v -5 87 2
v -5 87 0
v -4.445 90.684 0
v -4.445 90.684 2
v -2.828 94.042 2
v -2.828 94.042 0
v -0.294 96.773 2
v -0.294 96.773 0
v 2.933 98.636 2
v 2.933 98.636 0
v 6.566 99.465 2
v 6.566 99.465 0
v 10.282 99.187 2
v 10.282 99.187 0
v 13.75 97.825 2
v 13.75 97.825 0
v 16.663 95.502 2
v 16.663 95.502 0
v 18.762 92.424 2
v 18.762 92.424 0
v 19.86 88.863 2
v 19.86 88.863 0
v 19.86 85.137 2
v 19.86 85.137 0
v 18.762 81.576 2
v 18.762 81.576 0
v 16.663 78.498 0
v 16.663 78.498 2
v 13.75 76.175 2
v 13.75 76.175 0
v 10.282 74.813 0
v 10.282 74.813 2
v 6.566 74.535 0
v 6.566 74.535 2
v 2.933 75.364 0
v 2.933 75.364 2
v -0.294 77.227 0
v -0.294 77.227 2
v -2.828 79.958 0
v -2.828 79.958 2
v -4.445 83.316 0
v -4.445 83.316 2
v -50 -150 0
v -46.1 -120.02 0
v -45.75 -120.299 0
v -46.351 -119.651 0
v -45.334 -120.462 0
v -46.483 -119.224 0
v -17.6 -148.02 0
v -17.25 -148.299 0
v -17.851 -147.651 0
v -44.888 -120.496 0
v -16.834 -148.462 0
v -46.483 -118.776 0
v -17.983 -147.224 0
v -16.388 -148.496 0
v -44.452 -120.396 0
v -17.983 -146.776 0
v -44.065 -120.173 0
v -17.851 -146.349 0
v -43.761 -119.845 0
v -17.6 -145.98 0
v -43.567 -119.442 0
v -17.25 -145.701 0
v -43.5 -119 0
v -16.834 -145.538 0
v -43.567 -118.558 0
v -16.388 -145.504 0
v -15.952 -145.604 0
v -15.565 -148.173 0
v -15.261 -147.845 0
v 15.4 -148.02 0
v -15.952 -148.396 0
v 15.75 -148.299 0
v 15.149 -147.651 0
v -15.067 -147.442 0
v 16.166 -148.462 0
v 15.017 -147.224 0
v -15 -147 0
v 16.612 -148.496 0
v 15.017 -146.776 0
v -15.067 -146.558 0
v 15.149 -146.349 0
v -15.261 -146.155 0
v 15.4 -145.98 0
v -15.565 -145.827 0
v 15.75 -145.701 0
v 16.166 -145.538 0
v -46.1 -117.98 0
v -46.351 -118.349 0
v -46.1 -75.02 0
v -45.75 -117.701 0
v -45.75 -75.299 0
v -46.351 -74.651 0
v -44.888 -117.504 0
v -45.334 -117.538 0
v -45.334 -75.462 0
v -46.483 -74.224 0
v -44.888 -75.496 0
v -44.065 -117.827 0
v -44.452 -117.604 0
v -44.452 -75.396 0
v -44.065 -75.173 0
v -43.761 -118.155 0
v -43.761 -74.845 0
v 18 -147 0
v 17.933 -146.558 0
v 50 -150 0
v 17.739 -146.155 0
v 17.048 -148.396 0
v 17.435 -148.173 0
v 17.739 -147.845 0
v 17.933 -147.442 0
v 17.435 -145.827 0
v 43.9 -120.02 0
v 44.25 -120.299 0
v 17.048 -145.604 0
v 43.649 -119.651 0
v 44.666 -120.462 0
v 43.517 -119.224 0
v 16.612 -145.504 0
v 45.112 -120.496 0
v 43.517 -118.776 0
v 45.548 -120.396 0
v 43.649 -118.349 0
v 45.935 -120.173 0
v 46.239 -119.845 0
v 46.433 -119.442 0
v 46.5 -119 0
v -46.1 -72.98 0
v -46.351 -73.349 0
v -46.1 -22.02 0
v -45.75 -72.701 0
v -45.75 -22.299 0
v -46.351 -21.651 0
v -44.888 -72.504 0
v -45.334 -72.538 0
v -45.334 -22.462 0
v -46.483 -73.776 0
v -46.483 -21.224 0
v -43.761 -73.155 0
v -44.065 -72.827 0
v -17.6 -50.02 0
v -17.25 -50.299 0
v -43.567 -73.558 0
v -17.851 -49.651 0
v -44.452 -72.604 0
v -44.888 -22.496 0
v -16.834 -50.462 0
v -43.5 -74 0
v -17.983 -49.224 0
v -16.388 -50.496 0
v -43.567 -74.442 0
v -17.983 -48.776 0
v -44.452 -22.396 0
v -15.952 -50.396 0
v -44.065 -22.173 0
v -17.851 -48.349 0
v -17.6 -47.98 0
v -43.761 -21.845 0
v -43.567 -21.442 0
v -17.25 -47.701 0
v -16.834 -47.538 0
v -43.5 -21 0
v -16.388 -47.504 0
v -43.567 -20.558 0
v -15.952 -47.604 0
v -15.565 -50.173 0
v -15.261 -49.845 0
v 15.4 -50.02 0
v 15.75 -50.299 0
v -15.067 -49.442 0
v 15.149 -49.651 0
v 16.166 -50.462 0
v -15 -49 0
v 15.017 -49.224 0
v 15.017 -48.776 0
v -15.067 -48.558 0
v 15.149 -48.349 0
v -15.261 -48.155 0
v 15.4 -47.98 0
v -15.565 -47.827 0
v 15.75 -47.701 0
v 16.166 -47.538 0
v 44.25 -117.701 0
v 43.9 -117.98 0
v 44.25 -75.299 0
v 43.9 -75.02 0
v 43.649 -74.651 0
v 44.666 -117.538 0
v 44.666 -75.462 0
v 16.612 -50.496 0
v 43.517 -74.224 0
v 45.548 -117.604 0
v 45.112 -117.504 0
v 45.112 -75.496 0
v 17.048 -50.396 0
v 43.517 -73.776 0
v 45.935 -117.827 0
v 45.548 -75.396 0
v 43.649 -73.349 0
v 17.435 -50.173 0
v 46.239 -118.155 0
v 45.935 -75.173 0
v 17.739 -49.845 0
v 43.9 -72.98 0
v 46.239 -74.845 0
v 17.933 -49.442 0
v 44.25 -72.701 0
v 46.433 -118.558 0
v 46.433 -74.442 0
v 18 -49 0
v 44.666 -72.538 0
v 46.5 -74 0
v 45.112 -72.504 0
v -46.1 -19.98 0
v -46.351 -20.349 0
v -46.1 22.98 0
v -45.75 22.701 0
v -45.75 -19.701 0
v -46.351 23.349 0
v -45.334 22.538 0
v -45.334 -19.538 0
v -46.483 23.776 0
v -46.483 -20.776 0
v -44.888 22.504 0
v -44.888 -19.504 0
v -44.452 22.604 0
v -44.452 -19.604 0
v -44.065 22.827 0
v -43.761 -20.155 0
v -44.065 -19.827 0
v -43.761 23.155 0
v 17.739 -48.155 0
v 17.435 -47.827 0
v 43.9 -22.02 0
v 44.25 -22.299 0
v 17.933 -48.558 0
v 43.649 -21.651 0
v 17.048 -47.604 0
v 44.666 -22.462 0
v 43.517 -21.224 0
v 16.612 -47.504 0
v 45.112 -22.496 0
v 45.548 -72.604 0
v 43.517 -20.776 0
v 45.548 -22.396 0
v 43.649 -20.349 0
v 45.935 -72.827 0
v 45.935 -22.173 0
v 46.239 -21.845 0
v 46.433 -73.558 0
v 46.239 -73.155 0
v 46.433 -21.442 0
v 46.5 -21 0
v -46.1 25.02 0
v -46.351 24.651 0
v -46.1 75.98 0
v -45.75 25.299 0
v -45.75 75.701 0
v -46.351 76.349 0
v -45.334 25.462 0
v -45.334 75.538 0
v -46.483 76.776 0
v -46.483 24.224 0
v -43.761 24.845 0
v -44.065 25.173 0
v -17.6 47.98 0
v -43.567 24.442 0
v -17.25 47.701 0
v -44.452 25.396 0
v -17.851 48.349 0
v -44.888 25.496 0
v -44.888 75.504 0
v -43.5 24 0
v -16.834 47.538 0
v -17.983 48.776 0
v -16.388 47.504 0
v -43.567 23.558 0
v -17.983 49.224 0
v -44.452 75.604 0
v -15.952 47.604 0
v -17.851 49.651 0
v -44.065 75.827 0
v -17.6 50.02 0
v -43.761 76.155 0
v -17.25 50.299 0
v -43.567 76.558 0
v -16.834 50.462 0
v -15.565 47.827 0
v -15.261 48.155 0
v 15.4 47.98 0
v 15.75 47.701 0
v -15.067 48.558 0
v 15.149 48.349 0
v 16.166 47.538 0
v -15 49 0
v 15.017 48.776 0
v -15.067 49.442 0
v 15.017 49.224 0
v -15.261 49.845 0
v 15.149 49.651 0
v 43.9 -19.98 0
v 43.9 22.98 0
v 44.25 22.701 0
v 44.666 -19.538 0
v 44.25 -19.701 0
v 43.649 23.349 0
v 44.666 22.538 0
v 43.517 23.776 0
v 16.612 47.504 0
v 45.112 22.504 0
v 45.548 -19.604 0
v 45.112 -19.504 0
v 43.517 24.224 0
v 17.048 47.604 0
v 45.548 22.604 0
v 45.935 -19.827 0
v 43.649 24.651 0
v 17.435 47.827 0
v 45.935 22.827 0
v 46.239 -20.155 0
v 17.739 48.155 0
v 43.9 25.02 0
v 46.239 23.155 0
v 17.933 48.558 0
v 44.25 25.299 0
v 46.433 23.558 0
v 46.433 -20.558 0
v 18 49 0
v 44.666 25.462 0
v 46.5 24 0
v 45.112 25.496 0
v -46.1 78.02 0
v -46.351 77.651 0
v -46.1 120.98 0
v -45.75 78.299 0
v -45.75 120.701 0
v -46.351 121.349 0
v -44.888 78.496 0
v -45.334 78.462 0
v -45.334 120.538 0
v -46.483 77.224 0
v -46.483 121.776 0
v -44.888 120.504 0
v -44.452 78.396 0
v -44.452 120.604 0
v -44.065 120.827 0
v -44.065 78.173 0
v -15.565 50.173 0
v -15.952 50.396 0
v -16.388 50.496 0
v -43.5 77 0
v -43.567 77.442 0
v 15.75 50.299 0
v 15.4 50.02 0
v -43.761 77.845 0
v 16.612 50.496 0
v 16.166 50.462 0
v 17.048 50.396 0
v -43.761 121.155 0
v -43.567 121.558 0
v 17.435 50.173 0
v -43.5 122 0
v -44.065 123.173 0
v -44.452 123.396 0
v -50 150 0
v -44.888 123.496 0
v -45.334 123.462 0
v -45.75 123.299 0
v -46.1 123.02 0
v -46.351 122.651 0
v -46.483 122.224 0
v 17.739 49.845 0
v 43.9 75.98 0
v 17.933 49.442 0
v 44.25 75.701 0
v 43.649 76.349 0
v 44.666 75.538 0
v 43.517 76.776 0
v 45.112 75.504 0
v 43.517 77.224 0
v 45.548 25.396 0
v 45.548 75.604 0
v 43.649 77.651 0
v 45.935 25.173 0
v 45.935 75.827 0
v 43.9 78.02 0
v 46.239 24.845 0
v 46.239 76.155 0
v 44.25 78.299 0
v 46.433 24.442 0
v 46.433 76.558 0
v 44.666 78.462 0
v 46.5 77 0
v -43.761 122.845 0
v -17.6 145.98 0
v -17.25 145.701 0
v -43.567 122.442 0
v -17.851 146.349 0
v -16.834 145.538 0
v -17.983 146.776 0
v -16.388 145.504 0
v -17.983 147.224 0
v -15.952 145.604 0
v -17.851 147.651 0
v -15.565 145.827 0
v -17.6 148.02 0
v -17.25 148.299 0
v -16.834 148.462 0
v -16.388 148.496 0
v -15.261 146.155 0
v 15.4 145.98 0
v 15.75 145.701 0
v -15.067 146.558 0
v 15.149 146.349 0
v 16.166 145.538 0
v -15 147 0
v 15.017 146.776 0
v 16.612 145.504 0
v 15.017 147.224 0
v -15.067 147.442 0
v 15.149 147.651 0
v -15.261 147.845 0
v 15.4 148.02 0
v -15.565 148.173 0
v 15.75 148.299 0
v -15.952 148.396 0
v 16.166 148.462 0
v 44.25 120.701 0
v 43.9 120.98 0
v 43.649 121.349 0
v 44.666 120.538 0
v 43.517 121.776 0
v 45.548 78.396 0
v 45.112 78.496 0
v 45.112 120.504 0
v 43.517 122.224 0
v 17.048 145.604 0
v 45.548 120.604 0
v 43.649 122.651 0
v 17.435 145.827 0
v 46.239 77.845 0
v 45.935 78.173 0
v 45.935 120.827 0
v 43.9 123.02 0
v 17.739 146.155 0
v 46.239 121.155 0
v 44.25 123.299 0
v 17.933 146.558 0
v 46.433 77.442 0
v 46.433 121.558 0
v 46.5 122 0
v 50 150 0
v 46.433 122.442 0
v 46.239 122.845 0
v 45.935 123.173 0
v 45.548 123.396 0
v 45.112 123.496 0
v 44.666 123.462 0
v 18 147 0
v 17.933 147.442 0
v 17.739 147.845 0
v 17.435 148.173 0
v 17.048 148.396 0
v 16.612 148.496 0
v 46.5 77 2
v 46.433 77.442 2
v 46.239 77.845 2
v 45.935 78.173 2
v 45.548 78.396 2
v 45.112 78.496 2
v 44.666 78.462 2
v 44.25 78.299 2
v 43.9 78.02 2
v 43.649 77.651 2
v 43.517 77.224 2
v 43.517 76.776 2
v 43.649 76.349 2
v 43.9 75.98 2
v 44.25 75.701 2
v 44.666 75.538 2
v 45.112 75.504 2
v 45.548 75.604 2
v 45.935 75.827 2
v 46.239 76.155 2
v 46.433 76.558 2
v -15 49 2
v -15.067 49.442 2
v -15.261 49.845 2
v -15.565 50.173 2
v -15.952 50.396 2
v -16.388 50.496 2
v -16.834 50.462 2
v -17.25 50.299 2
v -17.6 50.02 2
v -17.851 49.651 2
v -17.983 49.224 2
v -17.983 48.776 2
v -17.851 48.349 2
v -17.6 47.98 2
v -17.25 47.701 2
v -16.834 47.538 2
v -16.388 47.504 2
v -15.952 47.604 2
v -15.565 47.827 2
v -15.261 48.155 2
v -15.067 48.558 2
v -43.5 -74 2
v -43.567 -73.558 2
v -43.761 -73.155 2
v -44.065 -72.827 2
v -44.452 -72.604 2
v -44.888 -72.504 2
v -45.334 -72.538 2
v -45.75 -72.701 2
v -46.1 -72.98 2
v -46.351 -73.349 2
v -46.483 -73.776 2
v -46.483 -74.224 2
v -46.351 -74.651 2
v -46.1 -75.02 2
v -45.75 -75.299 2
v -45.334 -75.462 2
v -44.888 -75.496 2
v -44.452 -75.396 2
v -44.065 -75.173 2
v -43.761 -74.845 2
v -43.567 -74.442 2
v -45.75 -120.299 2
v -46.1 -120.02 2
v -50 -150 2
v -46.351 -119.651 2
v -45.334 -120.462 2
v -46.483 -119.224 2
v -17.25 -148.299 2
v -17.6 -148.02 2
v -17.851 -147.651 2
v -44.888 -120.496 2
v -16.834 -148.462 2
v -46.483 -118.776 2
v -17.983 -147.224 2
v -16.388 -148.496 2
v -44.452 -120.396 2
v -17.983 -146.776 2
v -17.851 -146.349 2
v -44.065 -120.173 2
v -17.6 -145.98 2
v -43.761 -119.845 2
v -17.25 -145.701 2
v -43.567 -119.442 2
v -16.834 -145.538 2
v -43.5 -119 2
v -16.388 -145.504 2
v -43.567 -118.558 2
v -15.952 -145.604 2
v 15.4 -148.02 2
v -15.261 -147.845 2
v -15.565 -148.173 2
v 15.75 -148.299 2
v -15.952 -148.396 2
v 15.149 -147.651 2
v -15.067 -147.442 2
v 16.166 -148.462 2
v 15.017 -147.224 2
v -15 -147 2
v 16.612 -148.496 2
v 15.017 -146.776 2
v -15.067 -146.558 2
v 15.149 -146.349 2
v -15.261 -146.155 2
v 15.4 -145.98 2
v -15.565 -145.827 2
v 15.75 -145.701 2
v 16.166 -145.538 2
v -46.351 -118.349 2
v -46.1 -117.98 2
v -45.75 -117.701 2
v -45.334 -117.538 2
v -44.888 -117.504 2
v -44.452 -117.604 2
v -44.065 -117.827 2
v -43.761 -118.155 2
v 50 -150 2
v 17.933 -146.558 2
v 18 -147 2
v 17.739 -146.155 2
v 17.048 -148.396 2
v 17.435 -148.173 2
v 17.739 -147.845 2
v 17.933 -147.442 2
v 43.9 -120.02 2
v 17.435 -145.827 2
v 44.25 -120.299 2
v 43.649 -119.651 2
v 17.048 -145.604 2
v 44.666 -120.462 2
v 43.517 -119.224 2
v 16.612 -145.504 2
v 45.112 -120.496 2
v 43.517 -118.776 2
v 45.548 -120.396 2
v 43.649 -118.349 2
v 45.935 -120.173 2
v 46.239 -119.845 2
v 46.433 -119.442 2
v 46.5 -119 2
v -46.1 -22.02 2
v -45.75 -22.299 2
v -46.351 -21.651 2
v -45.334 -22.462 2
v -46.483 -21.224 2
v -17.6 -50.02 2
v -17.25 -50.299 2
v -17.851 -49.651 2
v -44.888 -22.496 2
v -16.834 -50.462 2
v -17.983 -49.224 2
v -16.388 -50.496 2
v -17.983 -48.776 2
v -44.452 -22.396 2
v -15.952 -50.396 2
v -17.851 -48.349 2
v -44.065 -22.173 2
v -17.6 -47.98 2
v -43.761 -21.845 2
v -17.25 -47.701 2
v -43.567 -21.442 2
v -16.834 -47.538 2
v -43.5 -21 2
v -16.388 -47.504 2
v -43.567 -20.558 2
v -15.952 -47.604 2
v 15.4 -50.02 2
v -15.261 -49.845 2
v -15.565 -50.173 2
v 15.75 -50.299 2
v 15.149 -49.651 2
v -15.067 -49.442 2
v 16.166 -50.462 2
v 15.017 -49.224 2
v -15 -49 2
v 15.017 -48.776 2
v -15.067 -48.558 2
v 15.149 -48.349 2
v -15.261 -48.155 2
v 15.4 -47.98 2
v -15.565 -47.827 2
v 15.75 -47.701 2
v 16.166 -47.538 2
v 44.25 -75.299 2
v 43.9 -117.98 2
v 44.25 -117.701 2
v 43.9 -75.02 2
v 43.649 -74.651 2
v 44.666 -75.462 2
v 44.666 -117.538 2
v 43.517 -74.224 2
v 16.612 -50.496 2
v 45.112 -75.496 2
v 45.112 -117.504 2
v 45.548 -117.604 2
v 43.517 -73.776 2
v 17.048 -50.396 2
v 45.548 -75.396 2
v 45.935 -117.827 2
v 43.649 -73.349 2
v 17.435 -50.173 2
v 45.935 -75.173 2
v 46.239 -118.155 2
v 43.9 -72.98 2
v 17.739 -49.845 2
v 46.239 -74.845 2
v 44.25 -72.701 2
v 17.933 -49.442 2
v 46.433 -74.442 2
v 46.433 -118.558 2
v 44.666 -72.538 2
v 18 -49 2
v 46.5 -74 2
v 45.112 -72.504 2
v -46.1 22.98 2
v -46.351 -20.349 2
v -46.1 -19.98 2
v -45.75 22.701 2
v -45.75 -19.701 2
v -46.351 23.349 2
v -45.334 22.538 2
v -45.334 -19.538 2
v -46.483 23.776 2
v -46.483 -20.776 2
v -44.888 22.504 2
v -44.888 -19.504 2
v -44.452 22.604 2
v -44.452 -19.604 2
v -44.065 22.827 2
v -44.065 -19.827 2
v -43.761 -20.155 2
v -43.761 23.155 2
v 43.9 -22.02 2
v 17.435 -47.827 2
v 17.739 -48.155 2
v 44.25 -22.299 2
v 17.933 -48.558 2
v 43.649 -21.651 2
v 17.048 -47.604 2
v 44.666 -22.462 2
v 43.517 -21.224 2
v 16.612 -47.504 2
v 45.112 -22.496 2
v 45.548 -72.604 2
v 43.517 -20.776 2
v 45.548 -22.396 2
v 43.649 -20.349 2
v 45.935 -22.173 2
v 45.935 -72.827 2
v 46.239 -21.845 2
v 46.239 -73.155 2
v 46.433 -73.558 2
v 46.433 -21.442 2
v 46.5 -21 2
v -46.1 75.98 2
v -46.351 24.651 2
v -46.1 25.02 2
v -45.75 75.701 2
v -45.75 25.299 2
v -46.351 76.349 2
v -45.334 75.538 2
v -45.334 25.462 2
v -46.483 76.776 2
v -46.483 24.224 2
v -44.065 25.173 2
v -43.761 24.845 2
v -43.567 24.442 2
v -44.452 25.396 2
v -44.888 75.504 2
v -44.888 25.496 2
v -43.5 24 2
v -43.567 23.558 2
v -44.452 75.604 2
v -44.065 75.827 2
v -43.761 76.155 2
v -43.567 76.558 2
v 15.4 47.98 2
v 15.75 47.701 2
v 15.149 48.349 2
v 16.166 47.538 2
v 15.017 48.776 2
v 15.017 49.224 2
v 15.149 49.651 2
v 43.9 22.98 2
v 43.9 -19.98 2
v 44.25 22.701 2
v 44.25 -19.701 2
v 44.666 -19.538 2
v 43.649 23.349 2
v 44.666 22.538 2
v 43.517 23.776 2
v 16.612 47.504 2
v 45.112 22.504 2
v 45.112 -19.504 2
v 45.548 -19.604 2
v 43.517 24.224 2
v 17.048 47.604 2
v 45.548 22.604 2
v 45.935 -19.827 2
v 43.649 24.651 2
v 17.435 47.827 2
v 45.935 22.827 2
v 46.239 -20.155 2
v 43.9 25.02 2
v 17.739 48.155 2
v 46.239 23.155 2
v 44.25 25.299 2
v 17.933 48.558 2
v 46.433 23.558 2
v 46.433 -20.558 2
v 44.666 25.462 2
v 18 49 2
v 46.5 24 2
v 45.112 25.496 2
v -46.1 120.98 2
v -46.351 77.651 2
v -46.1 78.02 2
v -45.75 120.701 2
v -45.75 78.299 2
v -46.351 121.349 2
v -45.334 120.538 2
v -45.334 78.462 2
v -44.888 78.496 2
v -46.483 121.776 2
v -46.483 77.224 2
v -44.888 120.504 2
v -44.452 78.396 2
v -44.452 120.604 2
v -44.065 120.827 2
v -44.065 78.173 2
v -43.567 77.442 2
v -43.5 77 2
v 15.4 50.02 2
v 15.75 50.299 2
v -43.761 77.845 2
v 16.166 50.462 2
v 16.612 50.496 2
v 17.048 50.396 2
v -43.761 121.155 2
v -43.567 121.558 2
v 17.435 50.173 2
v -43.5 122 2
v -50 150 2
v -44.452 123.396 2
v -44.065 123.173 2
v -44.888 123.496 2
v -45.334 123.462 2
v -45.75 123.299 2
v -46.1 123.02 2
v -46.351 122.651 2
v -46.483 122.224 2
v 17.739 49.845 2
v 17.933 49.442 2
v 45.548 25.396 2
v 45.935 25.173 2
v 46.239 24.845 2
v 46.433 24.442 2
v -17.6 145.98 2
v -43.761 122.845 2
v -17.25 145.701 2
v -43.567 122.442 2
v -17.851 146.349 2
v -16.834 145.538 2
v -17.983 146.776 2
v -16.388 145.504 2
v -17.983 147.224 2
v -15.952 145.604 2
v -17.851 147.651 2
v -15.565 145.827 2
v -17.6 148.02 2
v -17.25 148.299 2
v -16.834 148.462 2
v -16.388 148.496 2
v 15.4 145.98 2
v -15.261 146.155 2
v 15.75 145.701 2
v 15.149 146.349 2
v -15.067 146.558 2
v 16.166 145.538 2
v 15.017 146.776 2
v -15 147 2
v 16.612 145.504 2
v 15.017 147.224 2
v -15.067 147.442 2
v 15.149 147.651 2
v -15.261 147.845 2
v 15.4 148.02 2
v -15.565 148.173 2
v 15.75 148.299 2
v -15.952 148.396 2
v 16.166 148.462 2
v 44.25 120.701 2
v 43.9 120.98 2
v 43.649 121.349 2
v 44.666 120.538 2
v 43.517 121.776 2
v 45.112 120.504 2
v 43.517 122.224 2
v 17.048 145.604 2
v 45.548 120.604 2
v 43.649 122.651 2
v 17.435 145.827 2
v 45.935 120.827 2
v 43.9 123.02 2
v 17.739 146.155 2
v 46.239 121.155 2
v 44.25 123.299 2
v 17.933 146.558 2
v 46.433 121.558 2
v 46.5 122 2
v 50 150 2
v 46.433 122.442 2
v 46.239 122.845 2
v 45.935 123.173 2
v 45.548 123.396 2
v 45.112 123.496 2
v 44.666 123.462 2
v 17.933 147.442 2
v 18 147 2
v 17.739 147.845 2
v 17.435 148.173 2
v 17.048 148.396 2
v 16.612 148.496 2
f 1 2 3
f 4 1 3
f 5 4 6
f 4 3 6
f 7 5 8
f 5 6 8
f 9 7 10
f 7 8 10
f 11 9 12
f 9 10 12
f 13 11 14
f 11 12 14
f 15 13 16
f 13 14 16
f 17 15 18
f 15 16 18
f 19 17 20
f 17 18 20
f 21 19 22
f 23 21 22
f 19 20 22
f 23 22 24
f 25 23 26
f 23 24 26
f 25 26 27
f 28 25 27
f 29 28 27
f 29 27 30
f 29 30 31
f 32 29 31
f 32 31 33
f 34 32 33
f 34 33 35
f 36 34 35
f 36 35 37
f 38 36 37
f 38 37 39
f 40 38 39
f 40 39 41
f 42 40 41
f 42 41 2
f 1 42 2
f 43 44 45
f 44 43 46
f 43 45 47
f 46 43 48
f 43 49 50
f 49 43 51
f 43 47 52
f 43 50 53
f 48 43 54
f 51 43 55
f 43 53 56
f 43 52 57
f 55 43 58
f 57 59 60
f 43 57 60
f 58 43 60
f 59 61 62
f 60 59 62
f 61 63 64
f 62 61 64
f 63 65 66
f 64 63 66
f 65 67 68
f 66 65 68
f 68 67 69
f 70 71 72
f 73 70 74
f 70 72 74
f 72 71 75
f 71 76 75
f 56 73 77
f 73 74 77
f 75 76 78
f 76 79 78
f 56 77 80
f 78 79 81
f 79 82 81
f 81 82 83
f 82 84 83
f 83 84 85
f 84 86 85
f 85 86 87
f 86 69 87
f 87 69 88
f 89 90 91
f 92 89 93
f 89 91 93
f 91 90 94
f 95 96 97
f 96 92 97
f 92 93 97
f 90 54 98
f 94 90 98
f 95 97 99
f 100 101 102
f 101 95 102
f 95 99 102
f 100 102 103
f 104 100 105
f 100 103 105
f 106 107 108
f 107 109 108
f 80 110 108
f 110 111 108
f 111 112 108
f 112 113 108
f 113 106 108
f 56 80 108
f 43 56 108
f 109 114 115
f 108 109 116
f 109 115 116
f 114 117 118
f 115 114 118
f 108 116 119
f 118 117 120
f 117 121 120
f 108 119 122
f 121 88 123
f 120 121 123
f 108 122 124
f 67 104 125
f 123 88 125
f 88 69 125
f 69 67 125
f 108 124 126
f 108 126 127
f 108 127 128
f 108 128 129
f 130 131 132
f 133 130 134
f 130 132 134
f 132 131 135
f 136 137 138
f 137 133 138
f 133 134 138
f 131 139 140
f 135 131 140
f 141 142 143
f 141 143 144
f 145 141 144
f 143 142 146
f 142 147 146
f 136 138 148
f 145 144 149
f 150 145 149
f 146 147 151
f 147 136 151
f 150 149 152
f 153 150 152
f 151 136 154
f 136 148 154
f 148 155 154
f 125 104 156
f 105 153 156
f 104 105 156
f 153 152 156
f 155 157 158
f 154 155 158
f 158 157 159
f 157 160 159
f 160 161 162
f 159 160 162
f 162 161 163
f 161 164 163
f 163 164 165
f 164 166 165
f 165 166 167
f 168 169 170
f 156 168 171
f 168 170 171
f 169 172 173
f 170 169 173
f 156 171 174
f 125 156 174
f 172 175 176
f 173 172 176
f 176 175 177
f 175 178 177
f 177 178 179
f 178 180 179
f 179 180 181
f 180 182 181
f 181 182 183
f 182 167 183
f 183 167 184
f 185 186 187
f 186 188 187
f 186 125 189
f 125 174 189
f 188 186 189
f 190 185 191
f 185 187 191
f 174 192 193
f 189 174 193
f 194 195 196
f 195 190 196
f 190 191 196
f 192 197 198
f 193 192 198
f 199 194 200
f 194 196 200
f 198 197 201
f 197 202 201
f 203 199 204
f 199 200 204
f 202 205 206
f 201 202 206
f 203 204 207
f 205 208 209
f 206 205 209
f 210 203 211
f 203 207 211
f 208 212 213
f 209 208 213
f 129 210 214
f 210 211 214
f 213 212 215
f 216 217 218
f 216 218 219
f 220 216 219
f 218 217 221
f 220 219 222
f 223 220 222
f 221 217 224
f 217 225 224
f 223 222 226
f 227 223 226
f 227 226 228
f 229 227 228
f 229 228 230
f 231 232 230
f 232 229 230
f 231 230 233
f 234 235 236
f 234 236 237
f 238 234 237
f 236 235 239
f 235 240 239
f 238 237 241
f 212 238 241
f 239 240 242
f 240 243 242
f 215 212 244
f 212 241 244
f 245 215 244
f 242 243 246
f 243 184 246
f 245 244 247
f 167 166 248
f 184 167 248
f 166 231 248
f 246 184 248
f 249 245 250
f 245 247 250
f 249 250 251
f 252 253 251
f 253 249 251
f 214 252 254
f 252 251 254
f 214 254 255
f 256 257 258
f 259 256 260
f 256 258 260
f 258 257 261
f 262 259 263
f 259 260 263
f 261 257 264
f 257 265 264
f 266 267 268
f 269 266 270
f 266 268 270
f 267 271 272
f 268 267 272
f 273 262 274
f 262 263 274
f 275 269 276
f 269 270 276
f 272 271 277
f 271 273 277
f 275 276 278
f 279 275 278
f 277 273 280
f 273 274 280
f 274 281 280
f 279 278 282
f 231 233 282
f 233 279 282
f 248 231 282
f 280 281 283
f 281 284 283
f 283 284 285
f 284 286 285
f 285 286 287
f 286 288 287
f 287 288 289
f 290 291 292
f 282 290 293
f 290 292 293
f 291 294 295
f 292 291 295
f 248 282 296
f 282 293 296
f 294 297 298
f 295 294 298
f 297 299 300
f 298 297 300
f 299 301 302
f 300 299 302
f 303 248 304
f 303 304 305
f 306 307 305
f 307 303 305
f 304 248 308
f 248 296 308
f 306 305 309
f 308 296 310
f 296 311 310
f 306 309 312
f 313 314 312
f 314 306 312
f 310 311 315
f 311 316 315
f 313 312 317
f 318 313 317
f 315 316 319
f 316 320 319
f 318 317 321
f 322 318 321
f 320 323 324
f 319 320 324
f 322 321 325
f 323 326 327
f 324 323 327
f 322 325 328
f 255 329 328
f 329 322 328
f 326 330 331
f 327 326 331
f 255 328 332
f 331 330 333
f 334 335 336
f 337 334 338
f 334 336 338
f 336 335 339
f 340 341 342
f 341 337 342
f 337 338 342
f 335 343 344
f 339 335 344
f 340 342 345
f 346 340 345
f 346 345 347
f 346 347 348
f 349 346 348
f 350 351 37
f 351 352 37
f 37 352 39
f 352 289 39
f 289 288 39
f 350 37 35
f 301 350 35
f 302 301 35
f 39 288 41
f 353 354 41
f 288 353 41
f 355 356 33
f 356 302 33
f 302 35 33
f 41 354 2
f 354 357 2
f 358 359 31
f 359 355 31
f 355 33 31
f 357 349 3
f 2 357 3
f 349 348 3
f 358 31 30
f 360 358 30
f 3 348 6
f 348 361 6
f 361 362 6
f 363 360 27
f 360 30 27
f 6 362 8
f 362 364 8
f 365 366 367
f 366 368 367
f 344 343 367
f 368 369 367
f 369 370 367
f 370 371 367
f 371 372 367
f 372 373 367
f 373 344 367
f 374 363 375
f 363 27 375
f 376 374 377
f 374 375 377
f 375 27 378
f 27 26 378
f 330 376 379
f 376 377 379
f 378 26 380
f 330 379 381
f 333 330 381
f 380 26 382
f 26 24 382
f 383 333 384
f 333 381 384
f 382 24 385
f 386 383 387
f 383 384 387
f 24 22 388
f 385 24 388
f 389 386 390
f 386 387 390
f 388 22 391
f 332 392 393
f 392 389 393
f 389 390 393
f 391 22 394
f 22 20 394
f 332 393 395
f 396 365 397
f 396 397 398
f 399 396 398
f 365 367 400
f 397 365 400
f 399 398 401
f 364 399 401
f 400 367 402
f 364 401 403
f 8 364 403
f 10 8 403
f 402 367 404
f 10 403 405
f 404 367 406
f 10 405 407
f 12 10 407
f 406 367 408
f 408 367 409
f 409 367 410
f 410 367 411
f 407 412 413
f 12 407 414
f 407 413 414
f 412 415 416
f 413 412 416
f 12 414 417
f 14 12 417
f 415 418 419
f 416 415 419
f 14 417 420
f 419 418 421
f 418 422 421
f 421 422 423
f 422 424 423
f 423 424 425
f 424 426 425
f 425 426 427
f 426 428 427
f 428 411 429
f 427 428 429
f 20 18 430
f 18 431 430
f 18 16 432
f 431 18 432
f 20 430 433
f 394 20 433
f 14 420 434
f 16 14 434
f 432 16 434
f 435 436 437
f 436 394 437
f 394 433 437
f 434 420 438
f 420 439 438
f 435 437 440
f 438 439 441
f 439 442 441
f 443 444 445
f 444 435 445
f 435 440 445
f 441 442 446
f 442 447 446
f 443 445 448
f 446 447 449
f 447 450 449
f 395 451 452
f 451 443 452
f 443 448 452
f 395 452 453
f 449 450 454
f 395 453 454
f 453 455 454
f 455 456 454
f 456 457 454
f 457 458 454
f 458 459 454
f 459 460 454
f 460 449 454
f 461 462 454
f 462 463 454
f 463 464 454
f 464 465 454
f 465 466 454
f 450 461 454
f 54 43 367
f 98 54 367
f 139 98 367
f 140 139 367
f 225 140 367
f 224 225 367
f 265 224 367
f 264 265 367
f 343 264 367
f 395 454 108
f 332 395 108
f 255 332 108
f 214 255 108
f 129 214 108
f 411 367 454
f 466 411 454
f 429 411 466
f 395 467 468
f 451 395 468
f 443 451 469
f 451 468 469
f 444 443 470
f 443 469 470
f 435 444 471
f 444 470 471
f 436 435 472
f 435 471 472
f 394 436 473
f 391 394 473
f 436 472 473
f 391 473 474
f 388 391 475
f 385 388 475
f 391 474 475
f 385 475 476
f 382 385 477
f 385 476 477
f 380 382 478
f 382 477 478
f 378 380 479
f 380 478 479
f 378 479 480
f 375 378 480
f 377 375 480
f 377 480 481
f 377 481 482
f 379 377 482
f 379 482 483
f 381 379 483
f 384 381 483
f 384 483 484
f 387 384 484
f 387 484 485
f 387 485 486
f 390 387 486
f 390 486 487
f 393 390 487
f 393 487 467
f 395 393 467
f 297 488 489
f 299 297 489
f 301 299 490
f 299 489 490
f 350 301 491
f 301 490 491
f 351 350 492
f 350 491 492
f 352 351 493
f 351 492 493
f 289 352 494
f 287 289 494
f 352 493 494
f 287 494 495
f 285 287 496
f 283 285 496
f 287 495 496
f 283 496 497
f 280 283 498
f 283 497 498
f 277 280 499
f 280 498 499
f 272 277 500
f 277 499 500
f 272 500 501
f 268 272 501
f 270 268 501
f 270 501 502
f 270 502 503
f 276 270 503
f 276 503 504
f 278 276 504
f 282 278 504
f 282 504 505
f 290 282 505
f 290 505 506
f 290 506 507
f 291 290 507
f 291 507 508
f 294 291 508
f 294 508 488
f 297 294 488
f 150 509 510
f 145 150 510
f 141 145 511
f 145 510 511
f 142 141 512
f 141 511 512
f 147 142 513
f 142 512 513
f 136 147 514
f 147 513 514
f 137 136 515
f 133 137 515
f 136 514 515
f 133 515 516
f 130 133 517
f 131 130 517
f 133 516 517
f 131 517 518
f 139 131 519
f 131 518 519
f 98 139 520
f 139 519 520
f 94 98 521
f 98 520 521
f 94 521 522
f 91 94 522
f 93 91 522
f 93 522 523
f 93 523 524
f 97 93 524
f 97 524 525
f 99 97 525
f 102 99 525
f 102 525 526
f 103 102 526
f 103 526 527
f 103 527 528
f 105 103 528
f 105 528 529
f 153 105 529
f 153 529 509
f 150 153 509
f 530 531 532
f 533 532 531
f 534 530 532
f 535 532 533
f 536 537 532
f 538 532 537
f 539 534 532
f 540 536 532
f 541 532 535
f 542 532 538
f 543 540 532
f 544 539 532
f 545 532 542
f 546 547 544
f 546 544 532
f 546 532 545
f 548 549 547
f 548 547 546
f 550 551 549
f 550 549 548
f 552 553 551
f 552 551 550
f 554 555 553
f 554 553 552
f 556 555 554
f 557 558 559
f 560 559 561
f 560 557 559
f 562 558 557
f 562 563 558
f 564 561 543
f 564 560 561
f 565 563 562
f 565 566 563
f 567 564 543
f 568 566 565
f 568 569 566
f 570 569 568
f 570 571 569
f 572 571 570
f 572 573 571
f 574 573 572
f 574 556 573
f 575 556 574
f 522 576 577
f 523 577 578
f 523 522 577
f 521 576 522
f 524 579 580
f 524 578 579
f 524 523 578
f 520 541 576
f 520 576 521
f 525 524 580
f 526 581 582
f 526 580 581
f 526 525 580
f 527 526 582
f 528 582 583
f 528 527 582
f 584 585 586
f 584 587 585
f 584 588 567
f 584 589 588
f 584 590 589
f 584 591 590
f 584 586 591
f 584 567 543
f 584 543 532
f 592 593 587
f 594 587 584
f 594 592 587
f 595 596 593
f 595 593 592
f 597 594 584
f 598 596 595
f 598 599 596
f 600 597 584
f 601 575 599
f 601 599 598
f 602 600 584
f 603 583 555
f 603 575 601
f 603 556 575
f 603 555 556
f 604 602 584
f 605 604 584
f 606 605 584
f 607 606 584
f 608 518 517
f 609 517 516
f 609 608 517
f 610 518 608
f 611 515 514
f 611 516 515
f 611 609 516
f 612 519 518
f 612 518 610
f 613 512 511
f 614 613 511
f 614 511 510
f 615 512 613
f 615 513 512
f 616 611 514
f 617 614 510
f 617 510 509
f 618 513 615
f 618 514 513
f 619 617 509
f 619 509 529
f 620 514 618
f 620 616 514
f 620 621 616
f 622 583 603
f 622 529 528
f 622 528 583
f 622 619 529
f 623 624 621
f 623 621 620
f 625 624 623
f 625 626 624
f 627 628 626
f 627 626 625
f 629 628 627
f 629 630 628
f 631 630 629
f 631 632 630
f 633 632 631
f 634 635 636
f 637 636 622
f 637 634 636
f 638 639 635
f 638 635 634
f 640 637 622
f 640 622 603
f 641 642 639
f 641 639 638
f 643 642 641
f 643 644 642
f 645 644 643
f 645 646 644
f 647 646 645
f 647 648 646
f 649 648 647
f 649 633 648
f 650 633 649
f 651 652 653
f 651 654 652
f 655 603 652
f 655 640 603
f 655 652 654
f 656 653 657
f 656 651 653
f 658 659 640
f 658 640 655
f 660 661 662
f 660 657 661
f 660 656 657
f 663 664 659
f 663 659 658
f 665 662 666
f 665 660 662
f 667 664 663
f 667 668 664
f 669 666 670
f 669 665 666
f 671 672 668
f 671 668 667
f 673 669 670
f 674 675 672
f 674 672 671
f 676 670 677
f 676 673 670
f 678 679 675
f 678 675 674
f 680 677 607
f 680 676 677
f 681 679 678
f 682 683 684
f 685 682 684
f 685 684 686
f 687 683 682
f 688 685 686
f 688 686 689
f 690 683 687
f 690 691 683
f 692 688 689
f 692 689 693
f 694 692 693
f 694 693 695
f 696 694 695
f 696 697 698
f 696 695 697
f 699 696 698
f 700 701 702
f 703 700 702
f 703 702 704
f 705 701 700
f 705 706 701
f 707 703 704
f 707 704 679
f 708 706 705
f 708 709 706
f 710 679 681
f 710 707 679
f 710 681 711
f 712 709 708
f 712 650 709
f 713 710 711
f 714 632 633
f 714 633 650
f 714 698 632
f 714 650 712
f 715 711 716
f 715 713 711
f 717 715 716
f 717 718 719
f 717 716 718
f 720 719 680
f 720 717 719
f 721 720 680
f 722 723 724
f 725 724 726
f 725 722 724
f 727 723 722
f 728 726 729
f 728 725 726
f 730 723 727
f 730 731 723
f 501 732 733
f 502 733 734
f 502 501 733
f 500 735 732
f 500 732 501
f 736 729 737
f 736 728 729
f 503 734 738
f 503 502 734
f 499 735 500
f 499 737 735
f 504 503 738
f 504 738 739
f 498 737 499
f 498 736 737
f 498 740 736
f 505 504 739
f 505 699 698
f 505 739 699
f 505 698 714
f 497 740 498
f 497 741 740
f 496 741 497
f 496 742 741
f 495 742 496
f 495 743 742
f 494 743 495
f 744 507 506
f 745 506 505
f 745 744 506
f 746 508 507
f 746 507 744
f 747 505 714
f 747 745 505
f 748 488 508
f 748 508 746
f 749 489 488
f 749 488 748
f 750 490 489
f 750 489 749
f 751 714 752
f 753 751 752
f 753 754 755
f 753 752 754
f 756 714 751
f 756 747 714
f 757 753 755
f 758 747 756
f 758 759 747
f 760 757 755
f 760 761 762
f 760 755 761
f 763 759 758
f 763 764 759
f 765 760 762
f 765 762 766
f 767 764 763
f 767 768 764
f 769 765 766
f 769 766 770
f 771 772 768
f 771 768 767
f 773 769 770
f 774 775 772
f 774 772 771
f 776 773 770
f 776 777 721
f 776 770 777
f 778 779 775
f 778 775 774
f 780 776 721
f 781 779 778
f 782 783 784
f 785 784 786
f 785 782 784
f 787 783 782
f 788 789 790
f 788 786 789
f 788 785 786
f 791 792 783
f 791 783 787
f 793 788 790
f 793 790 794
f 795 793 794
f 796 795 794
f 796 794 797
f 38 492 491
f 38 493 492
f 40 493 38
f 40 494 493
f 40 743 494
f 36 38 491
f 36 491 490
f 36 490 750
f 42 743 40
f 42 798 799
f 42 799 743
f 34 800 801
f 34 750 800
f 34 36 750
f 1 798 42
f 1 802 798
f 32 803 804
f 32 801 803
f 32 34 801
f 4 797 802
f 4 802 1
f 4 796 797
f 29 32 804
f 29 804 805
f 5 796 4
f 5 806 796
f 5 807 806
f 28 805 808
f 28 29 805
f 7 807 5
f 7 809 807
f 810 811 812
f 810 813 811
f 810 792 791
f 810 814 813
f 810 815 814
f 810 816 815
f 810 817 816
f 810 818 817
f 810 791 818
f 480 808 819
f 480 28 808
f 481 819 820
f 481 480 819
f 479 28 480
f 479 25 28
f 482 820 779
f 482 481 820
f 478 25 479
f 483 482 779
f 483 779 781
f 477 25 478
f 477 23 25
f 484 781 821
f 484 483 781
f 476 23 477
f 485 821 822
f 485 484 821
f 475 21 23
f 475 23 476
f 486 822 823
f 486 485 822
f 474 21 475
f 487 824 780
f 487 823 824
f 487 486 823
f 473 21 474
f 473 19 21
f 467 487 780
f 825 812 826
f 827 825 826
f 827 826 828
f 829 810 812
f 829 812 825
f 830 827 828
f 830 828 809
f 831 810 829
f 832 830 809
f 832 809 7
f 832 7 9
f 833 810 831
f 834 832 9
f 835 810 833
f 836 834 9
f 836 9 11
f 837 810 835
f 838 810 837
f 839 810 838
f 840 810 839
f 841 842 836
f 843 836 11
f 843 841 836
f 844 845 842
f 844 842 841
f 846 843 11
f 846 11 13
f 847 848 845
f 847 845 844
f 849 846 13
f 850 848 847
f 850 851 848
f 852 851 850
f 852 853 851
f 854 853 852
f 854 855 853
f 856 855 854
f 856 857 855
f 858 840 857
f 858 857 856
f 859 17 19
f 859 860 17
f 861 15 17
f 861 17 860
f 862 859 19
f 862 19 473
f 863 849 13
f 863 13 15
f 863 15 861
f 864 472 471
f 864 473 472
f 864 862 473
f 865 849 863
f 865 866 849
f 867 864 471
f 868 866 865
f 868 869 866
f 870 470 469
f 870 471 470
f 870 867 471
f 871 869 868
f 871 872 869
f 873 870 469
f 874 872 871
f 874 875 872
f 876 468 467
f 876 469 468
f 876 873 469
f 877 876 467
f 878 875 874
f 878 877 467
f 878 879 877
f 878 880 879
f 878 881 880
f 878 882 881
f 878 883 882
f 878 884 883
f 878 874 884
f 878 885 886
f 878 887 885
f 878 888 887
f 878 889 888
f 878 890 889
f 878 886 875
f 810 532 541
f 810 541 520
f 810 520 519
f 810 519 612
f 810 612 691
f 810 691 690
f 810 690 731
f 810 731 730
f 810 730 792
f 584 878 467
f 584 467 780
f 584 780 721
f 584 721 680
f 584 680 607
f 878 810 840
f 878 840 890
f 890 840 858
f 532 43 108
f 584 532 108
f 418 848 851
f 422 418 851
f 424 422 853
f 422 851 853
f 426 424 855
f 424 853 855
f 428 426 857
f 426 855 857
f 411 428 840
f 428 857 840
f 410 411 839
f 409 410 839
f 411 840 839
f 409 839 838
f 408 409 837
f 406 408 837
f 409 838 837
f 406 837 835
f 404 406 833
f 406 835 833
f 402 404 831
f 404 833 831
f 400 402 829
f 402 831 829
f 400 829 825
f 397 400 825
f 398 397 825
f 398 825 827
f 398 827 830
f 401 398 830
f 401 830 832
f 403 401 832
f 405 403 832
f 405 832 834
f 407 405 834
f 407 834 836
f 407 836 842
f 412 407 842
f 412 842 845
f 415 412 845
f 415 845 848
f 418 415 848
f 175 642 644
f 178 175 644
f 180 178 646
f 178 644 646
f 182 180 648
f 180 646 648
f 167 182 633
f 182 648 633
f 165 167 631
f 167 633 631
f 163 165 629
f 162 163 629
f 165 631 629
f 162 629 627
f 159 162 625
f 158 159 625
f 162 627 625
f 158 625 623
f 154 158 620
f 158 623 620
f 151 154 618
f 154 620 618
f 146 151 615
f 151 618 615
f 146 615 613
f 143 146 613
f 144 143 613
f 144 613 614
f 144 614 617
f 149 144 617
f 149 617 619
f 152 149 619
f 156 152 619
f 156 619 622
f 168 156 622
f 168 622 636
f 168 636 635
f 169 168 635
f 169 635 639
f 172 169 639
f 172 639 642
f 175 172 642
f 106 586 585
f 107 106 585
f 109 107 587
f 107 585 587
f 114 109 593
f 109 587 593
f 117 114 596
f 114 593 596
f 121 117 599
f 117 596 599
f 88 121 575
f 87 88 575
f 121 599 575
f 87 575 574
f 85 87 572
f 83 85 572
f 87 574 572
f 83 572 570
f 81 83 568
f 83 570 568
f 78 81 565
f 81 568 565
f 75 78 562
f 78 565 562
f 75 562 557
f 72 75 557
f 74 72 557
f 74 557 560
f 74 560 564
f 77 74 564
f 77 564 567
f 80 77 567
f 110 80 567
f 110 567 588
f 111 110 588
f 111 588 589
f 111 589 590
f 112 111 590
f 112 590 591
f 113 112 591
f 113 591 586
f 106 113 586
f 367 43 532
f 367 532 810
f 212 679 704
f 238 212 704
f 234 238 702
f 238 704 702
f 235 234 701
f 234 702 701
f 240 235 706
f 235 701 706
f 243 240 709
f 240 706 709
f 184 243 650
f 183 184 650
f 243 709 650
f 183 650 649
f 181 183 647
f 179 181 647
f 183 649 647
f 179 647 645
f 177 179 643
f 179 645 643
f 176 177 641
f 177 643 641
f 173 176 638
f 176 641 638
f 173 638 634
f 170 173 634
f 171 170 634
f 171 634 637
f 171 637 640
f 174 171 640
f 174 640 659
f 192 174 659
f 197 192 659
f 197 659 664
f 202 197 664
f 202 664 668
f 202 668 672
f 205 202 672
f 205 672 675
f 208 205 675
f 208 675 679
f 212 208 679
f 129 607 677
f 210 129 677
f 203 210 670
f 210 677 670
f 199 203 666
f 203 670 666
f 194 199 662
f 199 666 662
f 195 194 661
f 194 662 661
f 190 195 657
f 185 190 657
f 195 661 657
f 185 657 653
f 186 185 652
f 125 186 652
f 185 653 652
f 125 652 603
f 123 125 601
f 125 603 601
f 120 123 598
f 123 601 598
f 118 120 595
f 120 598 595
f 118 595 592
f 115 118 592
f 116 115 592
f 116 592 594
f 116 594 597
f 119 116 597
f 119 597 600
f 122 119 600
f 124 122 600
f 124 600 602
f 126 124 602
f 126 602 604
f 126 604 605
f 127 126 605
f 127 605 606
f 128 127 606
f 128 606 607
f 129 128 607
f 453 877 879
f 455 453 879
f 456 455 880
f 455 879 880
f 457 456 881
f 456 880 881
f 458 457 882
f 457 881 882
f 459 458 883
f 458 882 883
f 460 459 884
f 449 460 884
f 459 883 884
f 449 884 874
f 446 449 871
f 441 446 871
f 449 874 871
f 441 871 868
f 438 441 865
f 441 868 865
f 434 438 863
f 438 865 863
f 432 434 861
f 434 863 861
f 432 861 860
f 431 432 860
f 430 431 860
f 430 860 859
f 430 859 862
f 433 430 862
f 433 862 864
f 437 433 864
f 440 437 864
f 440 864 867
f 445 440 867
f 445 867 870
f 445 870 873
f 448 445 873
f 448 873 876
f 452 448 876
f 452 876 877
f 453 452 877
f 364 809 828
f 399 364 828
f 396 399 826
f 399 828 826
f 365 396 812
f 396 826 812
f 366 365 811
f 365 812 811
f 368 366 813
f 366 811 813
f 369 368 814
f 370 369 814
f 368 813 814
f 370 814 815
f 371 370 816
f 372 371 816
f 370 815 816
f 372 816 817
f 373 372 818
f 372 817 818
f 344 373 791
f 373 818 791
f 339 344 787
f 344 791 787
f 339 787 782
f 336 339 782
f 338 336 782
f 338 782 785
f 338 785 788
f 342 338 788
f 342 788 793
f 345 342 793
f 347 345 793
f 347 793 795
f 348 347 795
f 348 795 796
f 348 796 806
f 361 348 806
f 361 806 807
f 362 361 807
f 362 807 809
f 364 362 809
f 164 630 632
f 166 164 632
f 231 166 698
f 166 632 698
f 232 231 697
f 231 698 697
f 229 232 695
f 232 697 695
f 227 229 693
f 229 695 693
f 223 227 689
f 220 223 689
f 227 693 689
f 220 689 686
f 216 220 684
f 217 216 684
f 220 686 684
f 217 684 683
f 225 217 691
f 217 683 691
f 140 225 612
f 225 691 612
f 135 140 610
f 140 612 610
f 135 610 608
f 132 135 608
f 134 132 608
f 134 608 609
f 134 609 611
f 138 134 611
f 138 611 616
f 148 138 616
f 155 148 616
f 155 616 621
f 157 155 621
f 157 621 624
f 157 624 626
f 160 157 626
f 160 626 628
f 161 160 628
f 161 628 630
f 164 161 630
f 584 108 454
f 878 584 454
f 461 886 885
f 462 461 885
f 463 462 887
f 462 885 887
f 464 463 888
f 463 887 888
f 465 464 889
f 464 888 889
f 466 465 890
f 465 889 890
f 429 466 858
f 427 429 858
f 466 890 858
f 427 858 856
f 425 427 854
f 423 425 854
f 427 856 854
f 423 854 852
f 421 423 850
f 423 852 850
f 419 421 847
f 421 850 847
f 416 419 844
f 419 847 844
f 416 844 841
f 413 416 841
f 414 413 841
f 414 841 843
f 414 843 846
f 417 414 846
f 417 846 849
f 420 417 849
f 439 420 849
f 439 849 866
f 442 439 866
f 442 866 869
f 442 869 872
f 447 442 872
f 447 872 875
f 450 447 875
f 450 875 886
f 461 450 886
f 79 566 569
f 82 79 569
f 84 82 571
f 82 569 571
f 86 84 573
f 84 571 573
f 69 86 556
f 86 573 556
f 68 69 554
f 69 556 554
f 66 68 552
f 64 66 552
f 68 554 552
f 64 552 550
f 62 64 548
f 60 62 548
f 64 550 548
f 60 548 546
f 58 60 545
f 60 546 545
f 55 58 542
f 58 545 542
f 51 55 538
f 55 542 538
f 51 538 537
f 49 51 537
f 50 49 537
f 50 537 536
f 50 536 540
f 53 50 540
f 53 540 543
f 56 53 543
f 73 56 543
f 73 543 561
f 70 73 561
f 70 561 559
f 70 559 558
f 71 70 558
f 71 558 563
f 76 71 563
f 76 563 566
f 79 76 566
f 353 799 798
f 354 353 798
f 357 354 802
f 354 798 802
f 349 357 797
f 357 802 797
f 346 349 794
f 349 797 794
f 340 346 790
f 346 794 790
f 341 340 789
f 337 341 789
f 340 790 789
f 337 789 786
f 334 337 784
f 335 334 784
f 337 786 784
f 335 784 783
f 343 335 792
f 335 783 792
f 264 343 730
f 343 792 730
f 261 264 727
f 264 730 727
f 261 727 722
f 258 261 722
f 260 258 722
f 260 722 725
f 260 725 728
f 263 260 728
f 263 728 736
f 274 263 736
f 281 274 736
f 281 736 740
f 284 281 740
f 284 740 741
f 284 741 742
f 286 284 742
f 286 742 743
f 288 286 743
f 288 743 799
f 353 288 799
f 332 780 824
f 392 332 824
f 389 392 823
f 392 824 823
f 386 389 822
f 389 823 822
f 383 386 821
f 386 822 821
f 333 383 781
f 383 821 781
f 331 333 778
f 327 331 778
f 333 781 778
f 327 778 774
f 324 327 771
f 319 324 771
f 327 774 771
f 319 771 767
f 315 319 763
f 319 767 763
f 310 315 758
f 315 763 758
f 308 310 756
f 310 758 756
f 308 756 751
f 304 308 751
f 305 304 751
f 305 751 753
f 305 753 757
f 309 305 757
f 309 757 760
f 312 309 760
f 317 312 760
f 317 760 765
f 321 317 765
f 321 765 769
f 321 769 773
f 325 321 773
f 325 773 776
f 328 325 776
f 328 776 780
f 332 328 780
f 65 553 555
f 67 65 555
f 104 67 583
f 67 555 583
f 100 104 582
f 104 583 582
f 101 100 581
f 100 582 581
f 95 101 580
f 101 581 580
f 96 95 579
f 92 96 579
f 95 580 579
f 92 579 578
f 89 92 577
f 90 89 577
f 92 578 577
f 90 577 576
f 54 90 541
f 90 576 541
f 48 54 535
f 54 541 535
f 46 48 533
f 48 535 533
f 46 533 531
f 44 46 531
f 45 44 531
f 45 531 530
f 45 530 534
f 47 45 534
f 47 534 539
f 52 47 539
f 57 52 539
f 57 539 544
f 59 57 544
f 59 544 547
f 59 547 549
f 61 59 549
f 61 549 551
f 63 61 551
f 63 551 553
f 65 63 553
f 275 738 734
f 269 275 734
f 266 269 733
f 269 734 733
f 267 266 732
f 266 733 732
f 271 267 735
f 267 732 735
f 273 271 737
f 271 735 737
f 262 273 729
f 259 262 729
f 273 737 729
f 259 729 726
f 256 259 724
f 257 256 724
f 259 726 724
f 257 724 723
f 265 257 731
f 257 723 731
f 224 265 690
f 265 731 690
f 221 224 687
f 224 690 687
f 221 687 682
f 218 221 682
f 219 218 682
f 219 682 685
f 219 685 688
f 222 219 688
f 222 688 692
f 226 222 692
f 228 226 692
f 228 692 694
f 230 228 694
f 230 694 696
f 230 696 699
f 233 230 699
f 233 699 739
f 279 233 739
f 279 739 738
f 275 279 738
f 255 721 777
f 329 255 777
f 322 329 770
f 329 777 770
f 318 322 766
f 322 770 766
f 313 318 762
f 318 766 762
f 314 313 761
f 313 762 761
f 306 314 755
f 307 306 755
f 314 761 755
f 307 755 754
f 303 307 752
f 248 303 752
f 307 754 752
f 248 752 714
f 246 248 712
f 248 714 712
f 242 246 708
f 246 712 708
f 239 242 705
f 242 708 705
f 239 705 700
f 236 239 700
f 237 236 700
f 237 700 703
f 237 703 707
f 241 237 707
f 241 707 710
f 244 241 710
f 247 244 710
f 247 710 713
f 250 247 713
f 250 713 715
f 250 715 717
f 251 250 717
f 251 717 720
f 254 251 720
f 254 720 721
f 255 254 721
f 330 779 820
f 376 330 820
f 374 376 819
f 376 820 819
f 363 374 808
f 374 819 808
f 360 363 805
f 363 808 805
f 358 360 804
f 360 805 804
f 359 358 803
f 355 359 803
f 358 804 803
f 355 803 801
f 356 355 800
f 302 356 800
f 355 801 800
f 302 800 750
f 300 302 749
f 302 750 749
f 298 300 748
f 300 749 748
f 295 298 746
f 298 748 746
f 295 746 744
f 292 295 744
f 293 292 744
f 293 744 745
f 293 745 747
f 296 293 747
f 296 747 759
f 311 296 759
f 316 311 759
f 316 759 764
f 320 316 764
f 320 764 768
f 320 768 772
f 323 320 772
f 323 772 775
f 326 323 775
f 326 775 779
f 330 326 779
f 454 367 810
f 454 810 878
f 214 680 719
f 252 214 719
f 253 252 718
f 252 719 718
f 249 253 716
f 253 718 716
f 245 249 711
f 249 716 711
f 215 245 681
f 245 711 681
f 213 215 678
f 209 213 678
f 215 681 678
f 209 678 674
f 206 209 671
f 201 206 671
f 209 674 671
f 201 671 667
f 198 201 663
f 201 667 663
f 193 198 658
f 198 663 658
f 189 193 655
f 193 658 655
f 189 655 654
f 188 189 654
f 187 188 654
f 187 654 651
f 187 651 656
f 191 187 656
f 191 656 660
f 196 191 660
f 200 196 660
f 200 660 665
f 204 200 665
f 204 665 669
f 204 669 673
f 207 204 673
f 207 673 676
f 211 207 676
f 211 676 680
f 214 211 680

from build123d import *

# Parameters (mm, degrees)
SKETCH1_W           = 100
SKETCH1_H           = 300
BOSS_EXTRUDE1_DEPTH = 2
SKETCH2_R           = 1.5
CUT_EXTRUDE1_DEPTH  = 10
SKETCH3_R           = 12.5
CUT_EXTRUDE2_DEPTH  = 10


with BuildPart() as part:
    # Sketch1 → Boss-Extrude1 (new body)
    with BuildSketch(Plane.XY):
        Rectangle(SKETCH1_W, SKETCH1_H)
    extrude(amount=BOSS_EXTRUDE1_DEPTH)

    # Sketch2 → Cut-Extrude1 (cut)
    with BuildSketch(Plane.XY.offset(2)):
        with Locations((-45, 122)):
            Circle(SKETCH2_R)
        with Locations((-45, 77)):
            Circle(SKETCH2_R)
        with Locations((45, 122)):
            Circle(SKETCH2_R)
        with Locations((45, 77)):
            Circle(SKETCH2_R)
        with Locations((-45, 24)):
            Circle(SKETCH2_R)
        with Locations((-45, -21)):
            Circle(SKETCH2_R)
        with Locations((45, 24)):
            Circle(SKETCH2_R)
        with Locations((45, -21)):
            Circle(SKETCH2_R)
        with Locations((-45, -74)):
            Circle(SKETCH2_R)
        with Locations((-45, -119)):
            Circle(SKETCH2_R)
        with Locations((45, -74)):
            Circle(SKETCH2_R)
        with Locations((45, -119)):
            Circle(SKETCH2_R)
        with Locations((16.5, -147)):
            Circle(SKETCH2_R)
        with Locations((-16.5, -147)):
            Circle(SKETCH2_R)
        with Locations((-16.5, -49)):
            Circle(SKETCH2_R)
        with Locations((16.5, -49)):
            Circle(SKETCH2_R)
        with Locations((-16.5, 49)):
            Circle(SKETCH2_R)
        with Locations((16.5, 49)):
            Circle(SKETCH2_R)
        with Locations((-16.5, 147)):
            Circle(SKETCH2_R)
        with Locations((16.5, 147)):
            Circle(SKETCH2_R)
    extrude(amount=-CUT_EXTRUDE1_DEPTH, mode=Mode.SUBTRACT)

    # Sketch3 → Cut-Extrude2 (cut)
    with BuildSketch(Plane(origin=(0, 0, 0), x_dir=(-1, 0, 0), z_dir=(0, 0, -1))):
        with Locations((-7.5, 87)):
            Circle(SKETCH3_R)
    extrude(amount=-CUT_EXTRUDE2_DEPTH, mode=Mode.SUBTRACT)


solid = part.part
